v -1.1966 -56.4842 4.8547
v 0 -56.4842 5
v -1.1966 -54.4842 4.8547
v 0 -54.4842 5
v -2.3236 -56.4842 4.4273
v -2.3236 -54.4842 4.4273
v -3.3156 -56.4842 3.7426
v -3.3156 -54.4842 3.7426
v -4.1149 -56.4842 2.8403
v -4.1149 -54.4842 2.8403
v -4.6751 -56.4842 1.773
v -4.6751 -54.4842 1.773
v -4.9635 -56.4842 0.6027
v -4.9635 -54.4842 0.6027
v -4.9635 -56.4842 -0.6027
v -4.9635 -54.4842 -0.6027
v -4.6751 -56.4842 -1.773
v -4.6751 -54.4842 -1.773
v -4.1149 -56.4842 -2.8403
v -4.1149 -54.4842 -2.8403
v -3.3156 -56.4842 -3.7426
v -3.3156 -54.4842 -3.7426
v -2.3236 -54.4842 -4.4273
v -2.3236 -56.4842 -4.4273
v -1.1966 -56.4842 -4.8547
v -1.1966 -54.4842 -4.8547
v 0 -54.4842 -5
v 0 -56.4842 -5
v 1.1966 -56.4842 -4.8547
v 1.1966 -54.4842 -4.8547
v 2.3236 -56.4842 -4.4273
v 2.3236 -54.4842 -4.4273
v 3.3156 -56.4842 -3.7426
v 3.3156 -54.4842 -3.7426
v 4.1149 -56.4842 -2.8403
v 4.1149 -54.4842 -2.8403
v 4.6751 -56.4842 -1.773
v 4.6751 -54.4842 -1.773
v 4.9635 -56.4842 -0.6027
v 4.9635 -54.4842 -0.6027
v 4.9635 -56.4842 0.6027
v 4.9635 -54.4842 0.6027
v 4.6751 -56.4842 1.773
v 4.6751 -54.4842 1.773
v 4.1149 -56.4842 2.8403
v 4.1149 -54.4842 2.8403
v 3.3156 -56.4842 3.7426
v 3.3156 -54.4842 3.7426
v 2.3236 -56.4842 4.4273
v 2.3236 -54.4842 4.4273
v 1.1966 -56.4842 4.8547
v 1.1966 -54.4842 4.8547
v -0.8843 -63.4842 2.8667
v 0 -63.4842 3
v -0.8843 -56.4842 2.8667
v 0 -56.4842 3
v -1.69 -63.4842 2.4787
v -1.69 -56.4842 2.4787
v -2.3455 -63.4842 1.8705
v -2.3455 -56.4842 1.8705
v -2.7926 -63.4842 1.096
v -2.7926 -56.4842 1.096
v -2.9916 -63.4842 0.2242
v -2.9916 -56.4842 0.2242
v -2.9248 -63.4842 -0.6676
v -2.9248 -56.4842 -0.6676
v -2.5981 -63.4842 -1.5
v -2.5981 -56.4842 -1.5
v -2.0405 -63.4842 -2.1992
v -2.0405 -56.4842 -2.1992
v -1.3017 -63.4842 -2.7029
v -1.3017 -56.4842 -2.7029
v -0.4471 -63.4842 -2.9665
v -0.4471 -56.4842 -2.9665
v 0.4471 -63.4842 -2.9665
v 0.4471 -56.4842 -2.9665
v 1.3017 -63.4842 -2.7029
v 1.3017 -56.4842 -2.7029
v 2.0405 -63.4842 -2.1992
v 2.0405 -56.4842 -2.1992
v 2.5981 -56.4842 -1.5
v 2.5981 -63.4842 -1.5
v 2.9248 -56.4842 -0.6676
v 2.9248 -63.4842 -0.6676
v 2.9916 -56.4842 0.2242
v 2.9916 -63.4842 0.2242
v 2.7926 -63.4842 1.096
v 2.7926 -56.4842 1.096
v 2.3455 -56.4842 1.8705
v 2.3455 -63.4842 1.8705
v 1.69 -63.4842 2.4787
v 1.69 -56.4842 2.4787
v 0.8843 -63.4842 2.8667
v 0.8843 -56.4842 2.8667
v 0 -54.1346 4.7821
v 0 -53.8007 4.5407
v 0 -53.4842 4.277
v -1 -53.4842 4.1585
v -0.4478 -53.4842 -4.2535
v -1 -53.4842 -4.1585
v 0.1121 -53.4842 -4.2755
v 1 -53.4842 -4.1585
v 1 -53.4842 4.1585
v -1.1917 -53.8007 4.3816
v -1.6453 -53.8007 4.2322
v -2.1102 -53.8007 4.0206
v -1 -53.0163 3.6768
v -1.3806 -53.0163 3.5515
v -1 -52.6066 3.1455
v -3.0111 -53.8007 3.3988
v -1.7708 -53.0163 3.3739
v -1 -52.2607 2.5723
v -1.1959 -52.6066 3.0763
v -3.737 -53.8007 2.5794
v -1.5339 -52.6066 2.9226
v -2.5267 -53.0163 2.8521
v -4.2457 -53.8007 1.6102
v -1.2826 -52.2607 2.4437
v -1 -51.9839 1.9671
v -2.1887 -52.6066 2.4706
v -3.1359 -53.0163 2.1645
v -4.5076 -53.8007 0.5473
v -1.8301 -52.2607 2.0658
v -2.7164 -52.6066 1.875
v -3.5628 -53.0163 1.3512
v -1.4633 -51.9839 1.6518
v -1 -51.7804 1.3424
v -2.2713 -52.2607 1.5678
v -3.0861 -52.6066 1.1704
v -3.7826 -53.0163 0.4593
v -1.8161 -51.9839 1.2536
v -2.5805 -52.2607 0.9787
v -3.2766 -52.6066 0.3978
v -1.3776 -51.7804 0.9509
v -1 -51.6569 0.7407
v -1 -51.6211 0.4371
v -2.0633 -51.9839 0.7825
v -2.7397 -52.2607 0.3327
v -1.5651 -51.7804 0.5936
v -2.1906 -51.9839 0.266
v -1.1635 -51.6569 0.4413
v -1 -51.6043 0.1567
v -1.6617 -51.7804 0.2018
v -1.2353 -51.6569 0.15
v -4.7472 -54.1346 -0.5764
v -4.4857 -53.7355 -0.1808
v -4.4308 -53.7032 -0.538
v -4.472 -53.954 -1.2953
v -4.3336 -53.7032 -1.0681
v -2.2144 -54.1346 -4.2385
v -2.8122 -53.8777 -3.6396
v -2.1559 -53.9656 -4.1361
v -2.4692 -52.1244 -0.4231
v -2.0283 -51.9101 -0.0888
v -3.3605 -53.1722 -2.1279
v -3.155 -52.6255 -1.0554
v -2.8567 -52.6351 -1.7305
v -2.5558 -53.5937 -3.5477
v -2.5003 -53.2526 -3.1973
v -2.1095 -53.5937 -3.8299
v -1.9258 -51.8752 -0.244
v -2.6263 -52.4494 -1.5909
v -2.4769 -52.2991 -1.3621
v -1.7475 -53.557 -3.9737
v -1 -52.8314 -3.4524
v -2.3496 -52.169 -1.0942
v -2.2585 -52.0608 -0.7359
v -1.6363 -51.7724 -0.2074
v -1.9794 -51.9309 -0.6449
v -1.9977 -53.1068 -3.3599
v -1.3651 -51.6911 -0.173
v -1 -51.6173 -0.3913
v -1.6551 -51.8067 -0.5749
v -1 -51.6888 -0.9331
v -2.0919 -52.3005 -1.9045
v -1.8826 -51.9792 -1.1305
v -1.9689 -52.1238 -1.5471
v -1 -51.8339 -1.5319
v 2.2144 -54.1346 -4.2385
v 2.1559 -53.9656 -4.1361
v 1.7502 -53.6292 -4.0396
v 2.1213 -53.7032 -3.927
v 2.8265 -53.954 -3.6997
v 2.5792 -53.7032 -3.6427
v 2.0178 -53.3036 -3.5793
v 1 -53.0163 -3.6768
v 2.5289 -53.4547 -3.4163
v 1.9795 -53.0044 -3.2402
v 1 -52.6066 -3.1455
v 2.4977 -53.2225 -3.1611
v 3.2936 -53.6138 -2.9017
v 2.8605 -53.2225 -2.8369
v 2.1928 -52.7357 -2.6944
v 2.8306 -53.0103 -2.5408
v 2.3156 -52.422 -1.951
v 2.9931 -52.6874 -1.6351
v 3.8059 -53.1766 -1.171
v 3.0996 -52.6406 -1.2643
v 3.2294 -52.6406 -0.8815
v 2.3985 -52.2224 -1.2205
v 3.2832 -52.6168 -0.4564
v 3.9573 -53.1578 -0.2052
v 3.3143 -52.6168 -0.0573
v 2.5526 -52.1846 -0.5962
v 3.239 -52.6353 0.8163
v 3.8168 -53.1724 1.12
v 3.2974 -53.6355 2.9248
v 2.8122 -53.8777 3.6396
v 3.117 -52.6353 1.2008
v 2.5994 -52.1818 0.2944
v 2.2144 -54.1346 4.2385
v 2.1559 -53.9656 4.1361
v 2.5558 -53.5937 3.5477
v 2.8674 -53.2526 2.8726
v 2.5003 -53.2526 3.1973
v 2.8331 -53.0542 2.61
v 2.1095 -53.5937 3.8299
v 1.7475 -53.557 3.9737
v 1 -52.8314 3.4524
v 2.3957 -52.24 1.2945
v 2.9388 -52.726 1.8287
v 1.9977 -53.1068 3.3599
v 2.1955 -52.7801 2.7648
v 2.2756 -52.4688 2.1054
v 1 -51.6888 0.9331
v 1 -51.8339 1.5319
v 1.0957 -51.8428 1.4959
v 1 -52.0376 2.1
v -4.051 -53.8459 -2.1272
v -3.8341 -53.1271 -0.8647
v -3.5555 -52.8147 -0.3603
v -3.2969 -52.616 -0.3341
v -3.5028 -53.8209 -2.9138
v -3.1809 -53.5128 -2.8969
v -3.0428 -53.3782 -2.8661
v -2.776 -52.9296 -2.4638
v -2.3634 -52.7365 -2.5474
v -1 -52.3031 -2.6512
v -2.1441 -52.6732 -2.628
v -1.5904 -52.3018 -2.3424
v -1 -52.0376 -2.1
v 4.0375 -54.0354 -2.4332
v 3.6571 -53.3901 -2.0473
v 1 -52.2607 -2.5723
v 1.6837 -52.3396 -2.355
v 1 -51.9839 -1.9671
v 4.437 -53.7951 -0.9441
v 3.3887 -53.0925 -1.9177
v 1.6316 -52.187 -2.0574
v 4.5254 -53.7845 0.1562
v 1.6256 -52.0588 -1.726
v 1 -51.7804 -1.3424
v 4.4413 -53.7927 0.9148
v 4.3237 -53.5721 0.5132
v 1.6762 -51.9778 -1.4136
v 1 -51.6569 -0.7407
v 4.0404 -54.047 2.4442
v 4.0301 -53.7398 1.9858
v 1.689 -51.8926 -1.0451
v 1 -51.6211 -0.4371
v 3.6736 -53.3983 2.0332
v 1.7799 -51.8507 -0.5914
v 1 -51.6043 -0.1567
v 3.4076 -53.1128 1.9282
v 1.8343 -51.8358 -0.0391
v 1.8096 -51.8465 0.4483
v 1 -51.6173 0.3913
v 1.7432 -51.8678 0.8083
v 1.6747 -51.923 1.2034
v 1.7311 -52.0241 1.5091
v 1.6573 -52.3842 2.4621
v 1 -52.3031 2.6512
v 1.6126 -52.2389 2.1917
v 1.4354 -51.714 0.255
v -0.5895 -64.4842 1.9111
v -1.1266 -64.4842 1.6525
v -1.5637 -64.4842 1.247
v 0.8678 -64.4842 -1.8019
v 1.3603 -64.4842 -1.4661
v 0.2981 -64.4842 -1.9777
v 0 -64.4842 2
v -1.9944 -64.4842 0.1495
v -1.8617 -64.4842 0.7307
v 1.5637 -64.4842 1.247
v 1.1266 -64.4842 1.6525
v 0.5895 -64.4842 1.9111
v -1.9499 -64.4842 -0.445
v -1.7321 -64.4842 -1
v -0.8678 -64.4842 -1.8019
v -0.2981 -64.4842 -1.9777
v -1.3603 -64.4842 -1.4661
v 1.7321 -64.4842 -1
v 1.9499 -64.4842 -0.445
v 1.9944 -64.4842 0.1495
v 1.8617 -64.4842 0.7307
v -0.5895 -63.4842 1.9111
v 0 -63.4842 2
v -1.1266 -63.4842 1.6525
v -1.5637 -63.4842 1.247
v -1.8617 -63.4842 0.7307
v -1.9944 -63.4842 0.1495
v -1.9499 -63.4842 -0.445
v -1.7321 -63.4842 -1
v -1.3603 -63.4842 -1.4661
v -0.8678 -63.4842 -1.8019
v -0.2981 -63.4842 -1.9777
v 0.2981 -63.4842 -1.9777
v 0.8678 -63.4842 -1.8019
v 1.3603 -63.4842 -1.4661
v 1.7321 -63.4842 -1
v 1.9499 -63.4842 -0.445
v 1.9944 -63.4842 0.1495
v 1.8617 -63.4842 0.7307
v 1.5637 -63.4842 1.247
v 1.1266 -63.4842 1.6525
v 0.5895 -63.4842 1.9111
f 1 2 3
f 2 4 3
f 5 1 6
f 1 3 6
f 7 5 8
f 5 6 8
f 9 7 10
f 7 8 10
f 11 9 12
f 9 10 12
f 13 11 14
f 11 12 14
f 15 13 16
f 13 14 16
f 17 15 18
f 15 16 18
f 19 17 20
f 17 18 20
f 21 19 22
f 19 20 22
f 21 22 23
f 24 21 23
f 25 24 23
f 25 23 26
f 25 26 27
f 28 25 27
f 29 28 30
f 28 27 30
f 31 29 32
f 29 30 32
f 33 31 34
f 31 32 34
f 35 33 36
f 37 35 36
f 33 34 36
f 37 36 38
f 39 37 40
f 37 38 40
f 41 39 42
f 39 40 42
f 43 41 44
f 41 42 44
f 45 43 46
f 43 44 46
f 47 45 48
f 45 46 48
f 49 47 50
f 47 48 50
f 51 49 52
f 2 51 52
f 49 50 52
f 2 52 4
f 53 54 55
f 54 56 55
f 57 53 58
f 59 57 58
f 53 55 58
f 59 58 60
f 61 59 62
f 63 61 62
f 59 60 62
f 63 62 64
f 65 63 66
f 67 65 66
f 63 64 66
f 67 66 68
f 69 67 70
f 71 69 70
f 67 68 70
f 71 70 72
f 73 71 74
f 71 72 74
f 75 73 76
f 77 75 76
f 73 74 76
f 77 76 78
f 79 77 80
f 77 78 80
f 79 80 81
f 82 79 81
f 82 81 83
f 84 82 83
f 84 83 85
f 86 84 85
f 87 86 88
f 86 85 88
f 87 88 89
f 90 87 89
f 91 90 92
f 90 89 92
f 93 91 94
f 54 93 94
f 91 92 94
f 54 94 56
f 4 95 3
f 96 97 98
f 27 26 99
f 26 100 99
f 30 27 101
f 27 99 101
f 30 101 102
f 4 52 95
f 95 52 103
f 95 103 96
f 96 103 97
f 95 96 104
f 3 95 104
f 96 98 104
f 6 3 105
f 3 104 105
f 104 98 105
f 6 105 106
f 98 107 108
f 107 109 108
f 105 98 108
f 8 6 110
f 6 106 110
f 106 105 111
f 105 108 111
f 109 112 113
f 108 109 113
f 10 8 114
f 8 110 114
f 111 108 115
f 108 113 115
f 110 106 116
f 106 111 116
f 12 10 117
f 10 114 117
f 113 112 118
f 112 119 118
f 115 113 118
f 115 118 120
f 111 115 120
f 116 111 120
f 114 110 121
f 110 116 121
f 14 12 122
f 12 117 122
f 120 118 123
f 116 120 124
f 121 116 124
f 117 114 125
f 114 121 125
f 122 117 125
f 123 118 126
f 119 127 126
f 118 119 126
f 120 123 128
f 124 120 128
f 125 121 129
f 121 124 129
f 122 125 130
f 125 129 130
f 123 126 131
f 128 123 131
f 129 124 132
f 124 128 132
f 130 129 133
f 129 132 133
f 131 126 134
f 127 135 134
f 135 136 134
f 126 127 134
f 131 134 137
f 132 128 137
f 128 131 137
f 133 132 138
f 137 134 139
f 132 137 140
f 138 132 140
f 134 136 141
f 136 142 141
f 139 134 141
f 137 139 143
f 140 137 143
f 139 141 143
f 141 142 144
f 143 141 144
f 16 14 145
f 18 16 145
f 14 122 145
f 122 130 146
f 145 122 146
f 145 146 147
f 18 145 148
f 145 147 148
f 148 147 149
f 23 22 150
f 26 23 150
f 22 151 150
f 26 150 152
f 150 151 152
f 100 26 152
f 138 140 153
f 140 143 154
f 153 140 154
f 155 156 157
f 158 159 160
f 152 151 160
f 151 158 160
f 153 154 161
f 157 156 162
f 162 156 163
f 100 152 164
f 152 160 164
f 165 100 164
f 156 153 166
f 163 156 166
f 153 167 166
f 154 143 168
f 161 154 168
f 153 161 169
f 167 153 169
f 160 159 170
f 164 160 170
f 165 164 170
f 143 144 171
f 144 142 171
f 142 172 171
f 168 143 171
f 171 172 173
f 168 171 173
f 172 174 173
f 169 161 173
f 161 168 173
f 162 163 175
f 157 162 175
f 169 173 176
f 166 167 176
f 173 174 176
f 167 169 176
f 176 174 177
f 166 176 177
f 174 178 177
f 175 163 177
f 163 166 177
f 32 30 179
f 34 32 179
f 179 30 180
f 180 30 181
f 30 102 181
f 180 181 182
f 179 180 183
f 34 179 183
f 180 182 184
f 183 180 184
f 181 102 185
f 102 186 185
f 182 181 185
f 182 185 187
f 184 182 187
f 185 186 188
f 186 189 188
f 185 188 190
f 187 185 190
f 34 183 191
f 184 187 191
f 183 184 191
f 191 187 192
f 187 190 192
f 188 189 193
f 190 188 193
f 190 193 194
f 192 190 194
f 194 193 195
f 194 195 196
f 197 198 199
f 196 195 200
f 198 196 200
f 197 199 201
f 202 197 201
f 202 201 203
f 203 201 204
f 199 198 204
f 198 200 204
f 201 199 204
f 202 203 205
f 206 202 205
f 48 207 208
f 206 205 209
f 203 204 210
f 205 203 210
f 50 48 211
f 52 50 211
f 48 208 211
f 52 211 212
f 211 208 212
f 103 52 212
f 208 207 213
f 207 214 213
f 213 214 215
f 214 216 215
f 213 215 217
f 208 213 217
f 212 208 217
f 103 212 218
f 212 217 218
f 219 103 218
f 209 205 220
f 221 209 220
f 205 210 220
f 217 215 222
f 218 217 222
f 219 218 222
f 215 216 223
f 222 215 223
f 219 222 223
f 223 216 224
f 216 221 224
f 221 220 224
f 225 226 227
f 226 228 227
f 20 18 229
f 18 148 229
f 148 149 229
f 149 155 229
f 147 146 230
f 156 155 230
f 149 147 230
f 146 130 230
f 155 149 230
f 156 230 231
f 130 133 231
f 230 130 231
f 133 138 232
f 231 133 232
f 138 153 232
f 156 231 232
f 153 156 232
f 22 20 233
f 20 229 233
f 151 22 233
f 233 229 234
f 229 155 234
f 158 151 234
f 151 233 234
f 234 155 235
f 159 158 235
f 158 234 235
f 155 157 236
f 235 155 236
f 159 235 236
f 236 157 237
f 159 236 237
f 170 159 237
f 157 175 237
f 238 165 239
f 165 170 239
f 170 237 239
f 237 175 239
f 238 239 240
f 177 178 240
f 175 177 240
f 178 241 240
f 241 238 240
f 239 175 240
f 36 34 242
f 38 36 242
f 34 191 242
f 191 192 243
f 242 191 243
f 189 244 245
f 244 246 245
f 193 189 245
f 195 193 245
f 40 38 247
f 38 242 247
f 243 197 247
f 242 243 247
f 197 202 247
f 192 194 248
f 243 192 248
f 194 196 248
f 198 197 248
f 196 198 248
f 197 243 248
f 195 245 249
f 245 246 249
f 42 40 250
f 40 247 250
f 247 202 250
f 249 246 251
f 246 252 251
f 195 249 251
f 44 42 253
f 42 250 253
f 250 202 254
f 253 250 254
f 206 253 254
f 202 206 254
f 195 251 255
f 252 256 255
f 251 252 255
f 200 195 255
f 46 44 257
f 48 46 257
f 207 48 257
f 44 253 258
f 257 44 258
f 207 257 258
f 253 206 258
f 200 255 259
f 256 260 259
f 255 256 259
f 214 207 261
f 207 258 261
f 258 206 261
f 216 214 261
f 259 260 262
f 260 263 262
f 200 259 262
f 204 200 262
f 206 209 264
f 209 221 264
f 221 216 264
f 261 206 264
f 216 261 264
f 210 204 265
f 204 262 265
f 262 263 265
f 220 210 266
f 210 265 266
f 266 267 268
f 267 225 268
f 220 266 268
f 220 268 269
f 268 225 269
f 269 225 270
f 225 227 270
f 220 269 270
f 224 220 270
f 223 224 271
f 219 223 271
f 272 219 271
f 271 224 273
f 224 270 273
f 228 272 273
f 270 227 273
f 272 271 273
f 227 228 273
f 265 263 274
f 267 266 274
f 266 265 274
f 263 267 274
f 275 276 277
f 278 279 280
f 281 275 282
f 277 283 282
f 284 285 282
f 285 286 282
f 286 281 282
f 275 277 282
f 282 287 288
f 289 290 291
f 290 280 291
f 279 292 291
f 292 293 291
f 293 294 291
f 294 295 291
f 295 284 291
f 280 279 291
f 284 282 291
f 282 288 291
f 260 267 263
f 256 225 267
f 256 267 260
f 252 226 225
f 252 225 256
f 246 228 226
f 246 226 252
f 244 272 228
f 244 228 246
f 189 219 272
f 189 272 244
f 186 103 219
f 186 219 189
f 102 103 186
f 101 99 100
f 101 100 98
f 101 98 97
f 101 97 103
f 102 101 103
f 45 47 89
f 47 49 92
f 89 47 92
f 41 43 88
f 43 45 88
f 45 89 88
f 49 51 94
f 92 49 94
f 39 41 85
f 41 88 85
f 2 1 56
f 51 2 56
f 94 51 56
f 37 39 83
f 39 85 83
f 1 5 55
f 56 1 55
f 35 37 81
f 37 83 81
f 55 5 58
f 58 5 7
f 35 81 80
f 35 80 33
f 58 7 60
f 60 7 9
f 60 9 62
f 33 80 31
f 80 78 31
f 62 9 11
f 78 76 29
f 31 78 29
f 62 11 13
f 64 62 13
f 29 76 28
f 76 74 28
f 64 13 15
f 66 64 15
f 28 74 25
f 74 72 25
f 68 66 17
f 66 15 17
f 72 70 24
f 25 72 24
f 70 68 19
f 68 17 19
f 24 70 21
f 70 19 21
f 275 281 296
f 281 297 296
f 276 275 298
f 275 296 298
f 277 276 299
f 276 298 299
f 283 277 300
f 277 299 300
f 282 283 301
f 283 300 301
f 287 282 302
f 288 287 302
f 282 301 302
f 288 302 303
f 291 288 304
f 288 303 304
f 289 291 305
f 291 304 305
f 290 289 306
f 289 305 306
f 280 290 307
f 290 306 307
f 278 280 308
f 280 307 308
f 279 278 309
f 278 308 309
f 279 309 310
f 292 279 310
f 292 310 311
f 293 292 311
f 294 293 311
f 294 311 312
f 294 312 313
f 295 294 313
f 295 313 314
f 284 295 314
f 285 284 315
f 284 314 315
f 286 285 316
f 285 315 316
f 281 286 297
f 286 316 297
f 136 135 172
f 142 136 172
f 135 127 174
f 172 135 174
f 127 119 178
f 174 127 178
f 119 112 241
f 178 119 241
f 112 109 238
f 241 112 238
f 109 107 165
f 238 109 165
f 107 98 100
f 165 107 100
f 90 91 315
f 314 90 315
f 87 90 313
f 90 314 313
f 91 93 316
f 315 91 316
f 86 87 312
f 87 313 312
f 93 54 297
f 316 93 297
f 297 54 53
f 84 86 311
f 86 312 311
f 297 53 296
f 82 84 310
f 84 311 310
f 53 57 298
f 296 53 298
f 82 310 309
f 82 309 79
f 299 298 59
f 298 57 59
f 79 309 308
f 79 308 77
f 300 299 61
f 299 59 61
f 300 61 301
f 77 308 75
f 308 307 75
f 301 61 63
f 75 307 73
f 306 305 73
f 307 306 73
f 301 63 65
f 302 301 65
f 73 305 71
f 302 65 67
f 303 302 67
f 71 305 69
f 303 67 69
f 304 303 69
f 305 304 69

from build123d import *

# Parameters (mm, degrees)
CUT_EXTRUDE1_DEPTH      = 65.870739766
CUT_EXTRUDE1_DEPTH_BACK = 65.870739766
SKETCH2_W               = 2
SKETCH2_H               = 2


with BuildPart() as part:
    # Sketch1 → Revolve2 (revolve)
    with BuildSketch(Plane.XY, mode=Mode.PRIVATE) as revolve2_sk:
        with BuildLine():
            Line((0, -64.484206406), (2, -64.484206406))
            Line((2, -64.484206406), (2, -63.484206406))
            Line((2, -63.484206406), (3, -63.484206406))
            Line((3, -63.484206406), (3, -56.484206406))
            Line((3, -56.484206406), (5, -56.484206406))
            Line((5, -56.484206406), (5, -54.484206406))
            ThreePointArc((5, -54.484206406), (2.888936029, -52.33597969), (0, -51.484206406))
            Line((0, -51.484206406), (0, -64.44100966))
            Line((0, -64.44100966), (0, -64.484206406))
        make_face()
    revolve(revolve2_sk.sketch.rotate(Axis((0, 49.98015998, 0), (0, -1, 0)), 90), axis=Axis((0, 49.98015998, 0), (0, -1, 0)))

    # Sketch2 → Cut-Extrude1 (cut, two sides: drawn at the far end of the back side and taken through both)
    with BuildSketch(Plane.XY.offset(-CUT_EXTRUDE1_DEPTH_BACK)):
        with Locations((0, -52.484206406)):
            Rectangle(SKETCH2_W, SKETCH2_H)
    extrude(amount=CUT_EXTRUDE1_DEPTH + CUT_EXTRUDE1_DEPTH_BACK, mode=Mode.SUBTRACT)


solid = part.part
